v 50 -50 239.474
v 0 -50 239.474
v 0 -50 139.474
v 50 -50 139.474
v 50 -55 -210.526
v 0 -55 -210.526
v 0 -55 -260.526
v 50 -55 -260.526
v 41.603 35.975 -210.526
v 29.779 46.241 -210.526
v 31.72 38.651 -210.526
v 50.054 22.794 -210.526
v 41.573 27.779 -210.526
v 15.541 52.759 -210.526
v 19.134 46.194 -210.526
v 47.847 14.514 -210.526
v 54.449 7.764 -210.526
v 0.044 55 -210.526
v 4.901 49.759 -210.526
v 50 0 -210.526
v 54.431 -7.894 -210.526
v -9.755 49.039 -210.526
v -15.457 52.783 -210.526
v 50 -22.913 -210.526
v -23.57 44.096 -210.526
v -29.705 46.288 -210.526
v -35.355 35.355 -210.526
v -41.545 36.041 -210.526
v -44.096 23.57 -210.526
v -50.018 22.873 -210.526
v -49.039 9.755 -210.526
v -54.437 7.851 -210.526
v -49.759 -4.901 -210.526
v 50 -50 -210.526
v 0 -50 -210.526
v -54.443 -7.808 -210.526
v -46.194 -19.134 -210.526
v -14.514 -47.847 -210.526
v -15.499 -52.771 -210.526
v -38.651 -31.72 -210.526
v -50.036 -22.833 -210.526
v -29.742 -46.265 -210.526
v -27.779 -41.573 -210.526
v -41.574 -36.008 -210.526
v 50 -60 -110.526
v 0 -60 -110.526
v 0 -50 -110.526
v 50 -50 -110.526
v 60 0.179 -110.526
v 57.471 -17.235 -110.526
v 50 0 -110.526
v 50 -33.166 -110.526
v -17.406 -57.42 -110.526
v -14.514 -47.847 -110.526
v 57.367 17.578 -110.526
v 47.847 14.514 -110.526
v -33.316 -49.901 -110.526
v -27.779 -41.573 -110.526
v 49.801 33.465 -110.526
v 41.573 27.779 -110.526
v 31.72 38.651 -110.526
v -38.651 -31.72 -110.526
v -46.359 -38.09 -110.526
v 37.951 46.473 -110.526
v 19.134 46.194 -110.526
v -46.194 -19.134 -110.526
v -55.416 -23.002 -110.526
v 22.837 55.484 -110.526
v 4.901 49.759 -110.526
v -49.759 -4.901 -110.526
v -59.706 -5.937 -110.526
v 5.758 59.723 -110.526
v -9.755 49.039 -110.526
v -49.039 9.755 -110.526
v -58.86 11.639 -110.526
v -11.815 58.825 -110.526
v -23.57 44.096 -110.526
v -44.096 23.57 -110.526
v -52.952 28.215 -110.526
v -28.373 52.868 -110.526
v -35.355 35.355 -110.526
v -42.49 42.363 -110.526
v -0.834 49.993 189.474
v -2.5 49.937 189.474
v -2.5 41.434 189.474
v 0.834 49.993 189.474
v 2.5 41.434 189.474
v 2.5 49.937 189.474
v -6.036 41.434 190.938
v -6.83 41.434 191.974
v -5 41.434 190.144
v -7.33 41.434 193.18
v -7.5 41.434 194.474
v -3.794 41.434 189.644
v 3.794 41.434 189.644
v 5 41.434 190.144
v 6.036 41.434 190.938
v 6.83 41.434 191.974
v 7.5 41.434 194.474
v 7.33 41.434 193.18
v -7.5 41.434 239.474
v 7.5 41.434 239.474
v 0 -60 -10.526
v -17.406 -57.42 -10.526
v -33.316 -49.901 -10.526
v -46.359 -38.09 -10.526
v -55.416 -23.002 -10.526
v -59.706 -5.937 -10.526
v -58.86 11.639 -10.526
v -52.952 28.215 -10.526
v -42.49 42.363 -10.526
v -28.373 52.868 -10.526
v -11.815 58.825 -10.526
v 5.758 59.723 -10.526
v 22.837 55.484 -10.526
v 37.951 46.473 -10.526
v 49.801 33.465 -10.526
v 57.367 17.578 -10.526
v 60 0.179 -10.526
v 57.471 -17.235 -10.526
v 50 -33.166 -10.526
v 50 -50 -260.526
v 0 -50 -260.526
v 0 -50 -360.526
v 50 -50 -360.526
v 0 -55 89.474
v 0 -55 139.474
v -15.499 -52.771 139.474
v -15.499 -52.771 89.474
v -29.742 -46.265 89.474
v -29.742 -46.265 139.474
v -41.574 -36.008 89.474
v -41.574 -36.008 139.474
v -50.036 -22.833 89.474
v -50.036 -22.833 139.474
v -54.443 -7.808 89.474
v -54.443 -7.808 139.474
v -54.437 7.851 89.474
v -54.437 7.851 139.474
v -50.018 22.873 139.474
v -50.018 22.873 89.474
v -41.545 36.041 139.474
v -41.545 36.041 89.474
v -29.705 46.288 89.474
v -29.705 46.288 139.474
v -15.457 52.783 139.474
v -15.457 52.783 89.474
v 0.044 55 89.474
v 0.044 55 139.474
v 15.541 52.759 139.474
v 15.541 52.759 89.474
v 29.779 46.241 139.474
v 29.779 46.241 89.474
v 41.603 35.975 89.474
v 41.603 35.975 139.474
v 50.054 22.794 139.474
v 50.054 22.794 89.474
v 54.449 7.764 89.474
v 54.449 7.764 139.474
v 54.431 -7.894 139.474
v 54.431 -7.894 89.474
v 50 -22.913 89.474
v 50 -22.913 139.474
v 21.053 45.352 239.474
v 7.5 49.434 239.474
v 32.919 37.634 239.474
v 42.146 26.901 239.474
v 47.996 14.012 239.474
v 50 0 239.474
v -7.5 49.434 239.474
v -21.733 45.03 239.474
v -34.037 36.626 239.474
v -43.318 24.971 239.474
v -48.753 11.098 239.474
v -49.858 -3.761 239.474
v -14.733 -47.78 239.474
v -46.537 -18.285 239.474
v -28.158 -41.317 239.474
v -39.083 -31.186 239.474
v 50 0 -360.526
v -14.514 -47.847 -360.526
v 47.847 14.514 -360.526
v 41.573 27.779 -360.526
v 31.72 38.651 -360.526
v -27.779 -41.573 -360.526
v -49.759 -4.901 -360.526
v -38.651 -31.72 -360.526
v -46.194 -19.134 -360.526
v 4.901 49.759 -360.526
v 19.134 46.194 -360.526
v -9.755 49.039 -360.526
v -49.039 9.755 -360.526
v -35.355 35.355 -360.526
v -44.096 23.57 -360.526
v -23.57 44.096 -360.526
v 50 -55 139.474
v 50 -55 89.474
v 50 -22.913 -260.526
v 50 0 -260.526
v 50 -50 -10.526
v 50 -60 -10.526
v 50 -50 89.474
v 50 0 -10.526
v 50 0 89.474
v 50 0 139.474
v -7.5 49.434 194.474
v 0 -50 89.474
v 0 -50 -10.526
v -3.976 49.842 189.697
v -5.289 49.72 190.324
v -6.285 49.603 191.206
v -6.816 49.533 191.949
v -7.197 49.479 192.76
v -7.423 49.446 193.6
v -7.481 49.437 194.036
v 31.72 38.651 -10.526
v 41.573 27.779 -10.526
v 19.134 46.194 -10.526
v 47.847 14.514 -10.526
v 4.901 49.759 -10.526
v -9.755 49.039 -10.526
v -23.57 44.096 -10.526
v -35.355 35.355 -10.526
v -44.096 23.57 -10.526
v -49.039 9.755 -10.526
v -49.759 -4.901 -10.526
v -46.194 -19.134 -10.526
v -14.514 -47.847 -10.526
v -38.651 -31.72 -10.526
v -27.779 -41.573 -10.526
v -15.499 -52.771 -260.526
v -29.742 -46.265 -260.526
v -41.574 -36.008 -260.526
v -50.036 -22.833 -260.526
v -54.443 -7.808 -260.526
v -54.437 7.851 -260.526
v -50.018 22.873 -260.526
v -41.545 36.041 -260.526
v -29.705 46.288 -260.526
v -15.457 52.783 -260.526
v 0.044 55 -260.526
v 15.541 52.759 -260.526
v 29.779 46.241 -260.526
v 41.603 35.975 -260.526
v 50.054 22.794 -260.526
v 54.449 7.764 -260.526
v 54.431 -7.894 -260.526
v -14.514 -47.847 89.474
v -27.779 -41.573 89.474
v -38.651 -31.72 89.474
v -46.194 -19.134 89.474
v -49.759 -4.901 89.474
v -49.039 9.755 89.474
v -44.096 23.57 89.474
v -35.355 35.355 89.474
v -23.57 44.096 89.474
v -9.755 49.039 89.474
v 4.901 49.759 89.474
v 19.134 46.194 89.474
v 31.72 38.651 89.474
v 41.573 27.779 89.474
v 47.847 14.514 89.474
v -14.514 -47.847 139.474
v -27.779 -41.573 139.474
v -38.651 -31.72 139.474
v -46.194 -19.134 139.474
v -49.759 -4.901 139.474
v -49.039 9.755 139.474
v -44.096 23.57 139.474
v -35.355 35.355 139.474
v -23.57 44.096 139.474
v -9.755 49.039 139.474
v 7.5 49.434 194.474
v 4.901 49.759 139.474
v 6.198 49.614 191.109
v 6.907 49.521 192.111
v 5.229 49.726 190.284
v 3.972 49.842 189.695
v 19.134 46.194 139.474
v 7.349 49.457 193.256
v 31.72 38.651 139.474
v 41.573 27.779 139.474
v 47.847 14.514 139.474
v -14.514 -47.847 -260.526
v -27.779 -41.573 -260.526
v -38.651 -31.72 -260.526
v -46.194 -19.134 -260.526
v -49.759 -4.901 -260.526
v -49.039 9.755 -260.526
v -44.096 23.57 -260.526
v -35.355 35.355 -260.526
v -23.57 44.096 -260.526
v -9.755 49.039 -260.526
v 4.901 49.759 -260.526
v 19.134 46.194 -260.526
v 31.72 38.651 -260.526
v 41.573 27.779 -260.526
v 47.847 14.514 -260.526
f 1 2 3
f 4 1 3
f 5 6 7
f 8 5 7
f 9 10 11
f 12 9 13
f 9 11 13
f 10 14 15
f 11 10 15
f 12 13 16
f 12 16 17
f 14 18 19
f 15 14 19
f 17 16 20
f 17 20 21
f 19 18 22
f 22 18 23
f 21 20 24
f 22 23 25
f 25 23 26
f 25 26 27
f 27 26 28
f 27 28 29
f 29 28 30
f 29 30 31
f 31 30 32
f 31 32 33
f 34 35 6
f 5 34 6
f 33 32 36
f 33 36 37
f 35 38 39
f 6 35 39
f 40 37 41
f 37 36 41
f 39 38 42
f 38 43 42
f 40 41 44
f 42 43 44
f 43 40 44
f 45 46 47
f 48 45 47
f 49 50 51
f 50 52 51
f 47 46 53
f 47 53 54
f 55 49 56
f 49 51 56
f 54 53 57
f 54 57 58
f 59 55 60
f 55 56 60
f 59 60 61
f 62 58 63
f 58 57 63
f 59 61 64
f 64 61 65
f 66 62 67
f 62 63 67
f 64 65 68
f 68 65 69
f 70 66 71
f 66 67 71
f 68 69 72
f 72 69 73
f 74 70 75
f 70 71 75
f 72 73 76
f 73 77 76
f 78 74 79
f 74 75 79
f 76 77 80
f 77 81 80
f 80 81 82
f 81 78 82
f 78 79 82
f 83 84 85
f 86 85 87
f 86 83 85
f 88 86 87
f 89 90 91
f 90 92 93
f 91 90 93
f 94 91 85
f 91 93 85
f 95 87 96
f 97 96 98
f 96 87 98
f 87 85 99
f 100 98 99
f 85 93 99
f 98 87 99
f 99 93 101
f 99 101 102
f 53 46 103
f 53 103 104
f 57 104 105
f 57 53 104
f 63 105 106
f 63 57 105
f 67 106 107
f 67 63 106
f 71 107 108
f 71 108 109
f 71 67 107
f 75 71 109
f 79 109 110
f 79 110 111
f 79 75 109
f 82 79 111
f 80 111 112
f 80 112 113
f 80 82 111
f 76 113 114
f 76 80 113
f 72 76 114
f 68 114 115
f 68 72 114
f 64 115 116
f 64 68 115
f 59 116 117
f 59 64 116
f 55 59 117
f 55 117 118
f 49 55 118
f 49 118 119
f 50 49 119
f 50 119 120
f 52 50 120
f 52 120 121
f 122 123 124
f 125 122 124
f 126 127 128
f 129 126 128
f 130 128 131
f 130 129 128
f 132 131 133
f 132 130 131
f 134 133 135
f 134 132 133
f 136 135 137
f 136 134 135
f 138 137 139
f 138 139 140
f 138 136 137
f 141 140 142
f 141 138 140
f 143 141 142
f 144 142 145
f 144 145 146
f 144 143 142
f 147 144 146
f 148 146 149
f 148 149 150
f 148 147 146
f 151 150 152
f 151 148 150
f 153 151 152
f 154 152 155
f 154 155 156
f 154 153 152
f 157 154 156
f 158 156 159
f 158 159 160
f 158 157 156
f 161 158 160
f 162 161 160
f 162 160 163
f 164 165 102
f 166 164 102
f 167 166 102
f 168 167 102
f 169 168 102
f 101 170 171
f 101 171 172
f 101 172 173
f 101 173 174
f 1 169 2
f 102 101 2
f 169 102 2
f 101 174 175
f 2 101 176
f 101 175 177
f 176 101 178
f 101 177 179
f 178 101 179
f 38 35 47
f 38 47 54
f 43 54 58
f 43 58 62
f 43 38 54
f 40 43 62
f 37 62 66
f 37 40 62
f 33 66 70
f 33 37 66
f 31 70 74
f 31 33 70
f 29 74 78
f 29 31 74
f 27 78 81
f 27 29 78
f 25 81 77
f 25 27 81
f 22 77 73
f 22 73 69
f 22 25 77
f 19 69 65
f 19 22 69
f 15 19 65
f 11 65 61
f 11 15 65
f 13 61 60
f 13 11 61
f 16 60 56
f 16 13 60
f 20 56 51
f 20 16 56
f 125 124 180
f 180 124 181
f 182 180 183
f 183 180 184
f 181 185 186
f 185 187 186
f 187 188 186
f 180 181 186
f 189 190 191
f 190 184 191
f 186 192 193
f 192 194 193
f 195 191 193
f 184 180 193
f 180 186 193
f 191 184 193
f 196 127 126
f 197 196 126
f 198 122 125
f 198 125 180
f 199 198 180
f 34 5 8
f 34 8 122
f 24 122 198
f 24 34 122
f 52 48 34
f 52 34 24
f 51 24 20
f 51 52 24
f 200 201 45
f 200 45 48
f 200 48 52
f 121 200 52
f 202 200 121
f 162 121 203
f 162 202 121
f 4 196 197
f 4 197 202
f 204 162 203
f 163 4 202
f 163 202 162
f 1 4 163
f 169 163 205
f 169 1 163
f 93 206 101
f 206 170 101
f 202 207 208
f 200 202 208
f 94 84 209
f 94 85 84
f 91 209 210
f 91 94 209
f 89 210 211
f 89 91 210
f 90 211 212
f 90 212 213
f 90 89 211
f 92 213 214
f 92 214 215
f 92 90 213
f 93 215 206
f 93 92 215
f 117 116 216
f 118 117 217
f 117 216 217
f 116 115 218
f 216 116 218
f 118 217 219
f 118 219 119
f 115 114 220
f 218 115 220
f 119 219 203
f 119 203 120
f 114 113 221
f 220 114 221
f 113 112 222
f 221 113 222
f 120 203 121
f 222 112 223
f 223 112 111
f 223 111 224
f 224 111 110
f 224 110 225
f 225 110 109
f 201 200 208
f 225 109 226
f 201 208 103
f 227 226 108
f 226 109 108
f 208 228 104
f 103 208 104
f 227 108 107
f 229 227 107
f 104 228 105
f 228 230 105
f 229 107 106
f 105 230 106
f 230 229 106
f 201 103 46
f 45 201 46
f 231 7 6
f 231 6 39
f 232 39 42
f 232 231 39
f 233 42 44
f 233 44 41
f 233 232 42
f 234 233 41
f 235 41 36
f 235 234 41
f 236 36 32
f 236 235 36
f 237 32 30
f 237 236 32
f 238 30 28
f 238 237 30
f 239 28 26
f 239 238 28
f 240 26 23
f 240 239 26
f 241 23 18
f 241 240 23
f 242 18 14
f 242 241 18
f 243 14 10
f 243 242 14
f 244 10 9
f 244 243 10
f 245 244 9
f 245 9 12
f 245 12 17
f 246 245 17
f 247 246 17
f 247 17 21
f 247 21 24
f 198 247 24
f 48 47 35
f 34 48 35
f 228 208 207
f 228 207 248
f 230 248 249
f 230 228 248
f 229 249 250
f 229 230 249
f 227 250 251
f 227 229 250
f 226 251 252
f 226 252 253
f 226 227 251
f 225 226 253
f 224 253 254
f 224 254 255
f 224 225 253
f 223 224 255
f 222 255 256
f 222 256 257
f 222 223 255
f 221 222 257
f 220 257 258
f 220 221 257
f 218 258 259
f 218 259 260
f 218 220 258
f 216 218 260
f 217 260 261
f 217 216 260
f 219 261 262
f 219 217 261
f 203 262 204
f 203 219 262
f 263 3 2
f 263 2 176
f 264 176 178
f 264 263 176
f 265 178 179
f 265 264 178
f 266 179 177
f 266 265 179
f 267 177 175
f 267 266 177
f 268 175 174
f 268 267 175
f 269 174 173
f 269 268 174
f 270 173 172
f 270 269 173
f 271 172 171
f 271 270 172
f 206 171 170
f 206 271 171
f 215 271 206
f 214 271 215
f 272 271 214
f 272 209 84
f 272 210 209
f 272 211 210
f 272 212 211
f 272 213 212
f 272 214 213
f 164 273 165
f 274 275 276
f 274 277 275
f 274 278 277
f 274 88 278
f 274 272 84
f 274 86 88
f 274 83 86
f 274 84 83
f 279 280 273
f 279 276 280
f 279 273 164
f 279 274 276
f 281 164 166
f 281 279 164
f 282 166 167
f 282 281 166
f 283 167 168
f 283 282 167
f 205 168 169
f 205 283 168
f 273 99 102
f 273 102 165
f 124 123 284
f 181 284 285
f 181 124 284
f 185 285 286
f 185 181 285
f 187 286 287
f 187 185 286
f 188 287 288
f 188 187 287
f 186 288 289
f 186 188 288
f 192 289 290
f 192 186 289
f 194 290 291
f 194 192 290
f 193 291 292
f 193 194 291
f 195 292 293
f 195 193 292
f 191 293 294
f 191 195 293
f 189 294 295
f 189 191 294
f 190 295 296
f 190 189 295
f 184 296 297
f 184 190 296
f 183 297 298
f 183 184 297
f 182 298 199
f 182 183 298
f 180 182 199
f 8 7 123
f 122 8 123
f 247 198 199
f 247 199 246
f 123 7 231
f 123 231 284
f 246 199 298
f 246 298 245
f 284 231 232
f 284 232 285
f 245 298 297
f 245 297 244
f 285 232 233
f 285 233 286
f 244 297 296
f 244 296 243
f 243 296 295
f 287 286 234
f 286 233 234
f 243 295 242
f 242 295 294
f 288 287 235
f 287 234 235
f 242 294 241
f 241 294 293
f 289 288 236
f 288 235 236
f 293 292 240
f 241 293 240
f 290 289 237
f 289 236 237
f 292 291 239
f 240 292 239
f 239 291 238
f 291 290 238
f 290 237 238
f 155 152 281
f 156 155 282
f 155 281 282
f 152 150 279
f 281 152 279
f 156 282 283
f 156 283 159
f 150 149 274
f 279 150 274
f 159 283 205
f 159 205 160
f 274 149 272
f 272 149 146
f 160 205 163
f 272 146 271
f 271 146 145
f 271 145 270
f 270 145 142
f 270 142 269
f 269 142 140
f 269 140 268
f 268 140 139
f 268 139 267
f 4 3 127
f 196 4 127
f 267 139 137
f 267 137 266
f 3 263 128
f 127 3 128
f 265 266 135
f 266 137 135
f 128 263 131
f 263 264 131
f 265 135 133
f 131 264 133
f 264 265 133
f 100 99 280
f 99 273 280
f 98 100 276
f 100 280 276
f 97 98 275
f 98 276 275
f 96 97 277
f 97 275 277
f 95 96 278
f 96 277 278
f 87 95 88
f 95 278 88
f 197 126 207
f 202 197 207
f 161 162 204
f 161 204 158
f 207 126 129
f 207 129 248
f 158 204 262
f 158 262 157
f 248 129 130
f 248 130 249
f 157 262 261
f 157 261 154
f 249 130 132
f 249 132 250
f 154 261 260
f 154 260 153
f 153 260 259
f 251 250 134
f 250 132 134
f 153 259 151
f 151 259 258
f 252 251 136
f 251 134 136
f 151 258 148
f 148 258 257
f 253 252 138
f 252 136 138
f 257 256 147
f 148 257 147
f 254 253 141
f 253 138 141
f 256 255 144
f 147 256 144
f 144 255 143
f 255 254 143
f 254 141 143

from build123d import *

# Parameters (mm, degrees)
F3_DEPTH = 50
F4_R     = 5
F5_DEPTH = 50


with BuildPart() as f1:
    # F0 (on Right) → F1 (revolve)
    with BuildSketch(Plane.YZ):
        Polygon((-50, -360.526346), (0, -360.526346), (0, 239.473654), (-50, 239.473654), (-50, 139.473654), (-55, 139.473654), (-55, 89.473654), (-50, 89.473654), (-50, -10.526346), (-60, -10.526346), (-60, -110.526346), (-50, -110.526346), (-50, -210.526346), (-55, -210.526346), (-55, -260.526346), (-50, -260.526346), align=None)
    revolve(axis=Axis((0, 0, -60.526346), (0, 0, -1)))

    # F2 (on face) → F3 (cut)
    with BuildSketch(Plane.XY.offset(239.473654)):
        with BuildLine():
            Line((7.5, 41.4343), (7.5, 49.4343))
            ThreePointArc((7.5, 49.4343), (0, 50), (-7.5, 49.4343))
            Line((-7.5, 49.4343), (-7.5, 41.4343))
            Line((-7.5, 41.4343), (7.5, 41.4343))
        make_face()
    extrude(amount=-F3_DEPTH, mode=Mode.SUBTRACT)

    # F4
    f4_edges = [f1.edges().sort_by_distance(p)[0] for p in [
        (-7.5, 45.4343, 189.473654),
        (7.5, 45.4343, 189.473654),
    ]]
    fillet(f4_edges, radius=F4_R)

    # F0 (on Right) → F5 (join)
    with BuildSketch(Plane.YZ):
        Polygon((-50, -360.526346), (0, -360.526346), (0, 239.473654), (-50, 239.473654), (-50, 139.473654), (-55, 139.473654), (-55, 89.473654), (-50, 89.473654), (-50, -10.526346), (-60, -10.526346), (-60, -110.526346), (-50, -110.526346), (-50, -210.526346), (-55, -210.526346), (-55, -260.526346), (-50, -260.526346), align=None)
    extrude(amount=F5_DEPTH)


solid = f1.part
